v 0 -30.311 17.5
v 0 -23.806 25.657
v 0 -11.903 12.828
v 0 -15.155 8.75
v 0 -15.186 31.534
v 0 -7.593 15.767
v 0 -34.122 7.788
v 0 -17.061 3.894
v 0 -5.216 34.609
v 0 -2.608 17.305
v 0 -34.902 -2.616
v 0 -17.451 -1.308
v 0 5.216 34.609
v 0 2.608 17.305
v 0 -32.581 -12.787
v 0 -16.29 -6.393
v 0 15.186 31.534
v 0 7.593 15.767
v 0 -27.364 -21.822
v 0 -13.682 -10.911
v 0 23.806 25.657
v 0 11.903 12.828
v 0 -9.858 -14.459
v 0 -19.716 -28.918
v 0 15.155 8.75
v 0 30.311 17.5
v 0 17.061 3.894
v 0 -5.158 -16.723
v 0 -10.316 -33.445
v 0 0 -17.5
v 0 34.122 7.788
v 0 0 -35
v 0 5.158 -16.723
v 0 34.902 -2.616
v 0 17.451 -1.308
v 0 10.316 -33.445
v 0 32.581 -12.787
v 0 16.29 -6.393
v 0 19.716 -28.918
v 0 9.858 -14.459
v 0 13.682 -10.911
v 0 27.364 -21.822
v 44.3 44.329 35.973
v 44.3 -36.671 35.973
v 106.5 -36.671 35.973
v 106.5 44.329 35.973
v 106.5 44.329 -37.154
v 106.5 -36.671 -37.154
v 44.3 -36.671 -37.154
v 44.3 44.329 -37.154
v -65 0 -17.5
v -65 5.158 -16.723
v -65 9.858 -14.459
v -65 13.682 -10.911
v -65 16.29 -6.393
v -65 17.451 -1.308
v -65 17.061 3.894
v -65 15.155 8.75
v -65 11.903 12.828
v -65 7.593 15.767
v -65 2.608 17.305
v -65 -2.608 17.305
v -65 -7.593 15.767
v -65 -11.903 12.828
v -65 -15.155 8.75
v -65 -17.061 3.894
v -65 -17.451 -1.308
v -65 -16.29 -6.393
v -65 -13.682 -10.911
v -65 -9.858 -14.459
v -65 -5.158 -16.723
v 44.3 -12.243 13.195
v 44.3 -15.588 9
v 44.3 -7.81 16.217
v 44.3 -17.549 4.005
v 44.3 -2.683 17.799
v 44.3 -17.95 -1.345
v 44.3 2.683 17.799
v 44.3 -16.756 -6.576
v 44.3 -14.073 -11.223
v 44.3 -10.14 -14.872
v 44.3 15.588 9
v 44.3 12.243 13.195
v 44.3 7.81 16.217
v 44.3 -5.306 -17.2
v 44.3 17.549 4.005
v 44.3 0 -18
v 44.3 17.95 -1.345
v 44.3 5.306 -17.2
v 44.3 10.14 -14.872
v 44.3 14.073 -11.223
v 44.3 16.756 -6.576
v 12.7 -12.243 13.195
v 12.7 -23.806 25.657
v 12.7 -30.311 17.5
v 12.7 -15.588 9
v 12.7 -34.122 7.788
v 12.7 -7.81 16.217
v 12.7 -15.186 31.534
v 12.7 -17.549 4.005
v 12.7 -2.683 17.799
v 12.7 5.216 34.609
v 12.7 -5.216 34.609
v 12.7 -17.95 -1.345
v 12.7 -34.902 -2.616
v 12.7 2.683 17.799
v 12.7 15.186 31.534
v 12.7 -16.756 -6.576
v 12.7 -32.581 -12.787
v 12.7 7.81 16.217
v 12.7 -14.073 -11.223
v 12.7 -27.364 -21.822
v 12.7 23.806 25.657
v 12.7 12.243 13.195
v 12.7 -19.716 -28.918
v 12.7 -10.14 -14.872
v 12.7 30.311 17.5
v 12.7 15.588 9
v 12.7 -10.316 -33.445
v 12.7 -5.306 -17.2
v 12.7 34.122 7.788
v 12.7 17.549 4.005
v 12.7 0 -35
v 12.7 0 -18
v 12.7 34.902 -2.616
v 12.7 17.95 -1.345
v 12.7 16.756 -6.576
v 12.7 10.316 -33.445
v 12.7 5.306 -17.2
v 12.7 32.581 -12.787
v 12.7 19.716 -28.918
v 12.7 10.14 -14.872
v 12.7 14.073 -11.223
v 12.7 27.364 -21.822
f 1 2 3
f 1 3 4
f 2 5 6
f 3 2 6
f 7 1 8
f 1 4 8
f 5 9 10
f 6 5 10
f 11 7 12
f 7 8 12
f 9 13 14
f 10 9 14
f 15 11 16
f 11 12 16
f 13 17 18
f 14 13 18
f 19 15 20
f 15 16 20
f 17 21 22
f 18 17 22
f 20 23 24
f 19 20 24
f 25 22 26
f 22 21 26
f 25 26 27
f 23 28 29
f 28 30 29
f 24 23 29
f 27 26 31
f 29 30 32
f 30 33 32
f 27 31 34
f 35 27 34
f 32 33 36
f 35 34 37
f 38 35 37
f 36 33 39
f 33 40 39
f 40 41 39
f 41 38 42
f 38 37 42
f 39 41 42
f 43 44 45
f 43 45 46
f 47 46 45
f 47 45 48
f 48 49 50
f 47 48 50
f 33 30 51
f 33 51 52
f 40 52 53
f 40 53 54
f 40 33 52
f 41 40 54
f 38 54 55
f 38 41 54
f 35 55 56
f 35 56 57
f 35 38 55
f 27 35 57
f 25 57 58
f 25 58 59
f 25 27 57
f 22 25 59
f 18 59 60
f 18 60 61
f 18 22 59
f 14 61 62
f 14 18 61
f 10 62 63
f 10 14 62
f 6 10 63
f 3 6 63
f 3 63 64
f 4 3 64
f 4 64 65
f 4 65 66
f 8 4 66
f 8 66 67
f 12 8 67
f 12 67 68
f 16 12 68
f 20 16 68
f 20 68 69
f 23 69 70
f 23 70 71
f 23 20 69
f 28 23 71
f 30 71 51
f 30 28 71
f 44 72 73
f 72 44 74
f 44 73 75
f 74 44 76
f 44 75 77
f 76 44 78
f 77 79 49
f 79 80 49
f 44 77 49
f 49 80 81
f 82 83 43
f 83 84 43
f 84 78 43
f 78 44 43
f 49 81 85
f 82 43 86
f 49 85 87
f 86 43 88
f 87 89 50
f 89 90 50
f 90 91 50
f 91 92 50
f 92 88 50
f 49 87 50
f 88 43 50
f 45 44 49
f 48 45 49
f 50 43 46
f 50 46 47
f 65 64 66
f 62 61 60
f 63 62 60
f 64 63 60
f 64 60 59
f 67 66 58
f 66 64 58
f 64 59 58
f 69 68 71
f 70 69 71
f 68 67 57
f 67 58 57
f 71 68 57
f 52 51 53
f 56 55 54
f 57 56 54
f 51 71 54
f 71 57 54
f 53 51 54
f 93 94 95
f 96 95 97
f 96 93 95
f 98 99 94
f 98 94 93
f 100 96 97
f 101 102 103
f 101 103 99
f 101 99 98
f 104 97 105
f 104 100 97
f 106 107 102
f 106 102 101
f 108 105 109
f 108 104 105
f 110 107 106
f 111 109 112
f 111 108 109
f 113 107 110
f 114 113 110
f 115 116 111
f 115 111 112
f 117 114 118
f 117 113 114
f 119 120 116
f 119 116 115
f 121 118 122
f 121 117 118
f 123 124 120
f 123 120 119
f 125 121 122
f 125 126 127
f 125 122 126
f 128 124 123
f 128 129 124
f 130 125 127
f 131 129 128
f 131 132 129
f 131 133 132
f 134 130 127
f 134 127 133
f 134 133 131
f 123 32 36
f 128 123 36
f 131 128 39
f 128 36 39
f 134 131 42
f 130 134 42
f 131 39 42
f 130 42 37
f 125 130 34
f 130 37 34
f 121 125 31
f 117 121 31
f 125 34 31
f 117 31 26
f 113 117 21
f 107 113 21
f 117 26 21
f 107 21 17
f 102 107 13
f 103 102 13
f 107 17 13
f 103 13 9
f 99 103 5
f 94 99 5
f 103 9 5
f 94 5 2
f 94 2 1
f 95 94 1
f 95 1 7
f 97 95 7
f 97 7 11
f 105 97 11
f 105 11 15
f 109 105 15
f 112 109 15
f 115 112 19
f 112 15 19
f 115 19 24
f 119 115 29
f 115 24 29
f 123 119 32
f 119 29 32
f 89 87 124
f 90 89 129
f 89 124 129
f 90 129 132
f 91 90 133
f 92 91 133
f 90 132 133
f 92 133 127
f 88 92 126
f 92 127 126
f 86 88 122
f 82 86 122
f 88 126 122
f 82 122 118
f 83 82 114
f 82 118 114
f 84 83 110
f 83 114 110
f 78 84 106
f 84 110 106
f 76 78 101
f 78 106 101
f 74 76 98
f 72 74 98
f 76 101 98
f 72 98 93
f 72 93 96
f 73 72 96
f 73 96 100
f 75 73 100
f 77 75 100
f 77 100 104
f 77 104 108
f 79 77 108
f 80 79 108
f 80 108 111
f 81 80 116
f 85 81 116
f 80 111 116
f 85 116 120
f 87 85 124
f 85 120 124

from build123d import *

# Parameters (mm, degrees)
SKETCH1_R           = 17.5
BOSS_EXTRUDE1_DEPTH = 65
SKETCH2_R           = 35
BOSS_EXTRUDE2_DEPTH = 12.7
SKETCH3_R           = 18
BOSS_EXTRUDE3_DEPTH = 31.6
SKETCH4_W           = 73.126959069
SKETCH4_H           = 81
BOSS_EXTRUDE4_DEPTH = 62.2


with BuildPart() as part:
    # Sketch1 → Boss-Extrude1 (new body)
    with BuildSketch(Plane(origin=(0, 0, 0), x_dir=(0, 0, -1), z_dir=(1, 0, 0))):
        Circle(SKETCH1_R)
    extrude(amount=-BOSS_EXTRUDE1_DEPTH)

    # Sketch2 → Boss-Extrude2 (add)
    with BuildSketch(Plane(origin=(0, 0, 0), x_dir=(0, 0, -1), z_dir=(1, 0, 0))):
        Circle(SKETCH2_R)
    extrude(amount=BOSS_EXTRUDE2_DEPTH)

    # Sketch3 → Boss-Extrude3 (add)
    with BuildSketch(Plane(origin=(12.7, 0, 0), x_dir=(0, 0, -1), z_dir=(1, 0, 0))):
        Circle(SKETCH3_R)
    extrude(amount=BOSS_EXTRUDE3_DEPTH)

    # Sketch4 → Boss-Extrude4 (add)
    with BuildSketch(Plane(origin=(44.3, 0, 0), x_dir=(0, 0, -1), z_dir=(1, 0, 0))):
        with Locations((0.590599522, 3.829138734)):
            Rectangle(SKETCH4_W, SKETCH4_H)
    extrude(amount=BOSS_EXTRUDE4_DEPTH)


solid = part.part
